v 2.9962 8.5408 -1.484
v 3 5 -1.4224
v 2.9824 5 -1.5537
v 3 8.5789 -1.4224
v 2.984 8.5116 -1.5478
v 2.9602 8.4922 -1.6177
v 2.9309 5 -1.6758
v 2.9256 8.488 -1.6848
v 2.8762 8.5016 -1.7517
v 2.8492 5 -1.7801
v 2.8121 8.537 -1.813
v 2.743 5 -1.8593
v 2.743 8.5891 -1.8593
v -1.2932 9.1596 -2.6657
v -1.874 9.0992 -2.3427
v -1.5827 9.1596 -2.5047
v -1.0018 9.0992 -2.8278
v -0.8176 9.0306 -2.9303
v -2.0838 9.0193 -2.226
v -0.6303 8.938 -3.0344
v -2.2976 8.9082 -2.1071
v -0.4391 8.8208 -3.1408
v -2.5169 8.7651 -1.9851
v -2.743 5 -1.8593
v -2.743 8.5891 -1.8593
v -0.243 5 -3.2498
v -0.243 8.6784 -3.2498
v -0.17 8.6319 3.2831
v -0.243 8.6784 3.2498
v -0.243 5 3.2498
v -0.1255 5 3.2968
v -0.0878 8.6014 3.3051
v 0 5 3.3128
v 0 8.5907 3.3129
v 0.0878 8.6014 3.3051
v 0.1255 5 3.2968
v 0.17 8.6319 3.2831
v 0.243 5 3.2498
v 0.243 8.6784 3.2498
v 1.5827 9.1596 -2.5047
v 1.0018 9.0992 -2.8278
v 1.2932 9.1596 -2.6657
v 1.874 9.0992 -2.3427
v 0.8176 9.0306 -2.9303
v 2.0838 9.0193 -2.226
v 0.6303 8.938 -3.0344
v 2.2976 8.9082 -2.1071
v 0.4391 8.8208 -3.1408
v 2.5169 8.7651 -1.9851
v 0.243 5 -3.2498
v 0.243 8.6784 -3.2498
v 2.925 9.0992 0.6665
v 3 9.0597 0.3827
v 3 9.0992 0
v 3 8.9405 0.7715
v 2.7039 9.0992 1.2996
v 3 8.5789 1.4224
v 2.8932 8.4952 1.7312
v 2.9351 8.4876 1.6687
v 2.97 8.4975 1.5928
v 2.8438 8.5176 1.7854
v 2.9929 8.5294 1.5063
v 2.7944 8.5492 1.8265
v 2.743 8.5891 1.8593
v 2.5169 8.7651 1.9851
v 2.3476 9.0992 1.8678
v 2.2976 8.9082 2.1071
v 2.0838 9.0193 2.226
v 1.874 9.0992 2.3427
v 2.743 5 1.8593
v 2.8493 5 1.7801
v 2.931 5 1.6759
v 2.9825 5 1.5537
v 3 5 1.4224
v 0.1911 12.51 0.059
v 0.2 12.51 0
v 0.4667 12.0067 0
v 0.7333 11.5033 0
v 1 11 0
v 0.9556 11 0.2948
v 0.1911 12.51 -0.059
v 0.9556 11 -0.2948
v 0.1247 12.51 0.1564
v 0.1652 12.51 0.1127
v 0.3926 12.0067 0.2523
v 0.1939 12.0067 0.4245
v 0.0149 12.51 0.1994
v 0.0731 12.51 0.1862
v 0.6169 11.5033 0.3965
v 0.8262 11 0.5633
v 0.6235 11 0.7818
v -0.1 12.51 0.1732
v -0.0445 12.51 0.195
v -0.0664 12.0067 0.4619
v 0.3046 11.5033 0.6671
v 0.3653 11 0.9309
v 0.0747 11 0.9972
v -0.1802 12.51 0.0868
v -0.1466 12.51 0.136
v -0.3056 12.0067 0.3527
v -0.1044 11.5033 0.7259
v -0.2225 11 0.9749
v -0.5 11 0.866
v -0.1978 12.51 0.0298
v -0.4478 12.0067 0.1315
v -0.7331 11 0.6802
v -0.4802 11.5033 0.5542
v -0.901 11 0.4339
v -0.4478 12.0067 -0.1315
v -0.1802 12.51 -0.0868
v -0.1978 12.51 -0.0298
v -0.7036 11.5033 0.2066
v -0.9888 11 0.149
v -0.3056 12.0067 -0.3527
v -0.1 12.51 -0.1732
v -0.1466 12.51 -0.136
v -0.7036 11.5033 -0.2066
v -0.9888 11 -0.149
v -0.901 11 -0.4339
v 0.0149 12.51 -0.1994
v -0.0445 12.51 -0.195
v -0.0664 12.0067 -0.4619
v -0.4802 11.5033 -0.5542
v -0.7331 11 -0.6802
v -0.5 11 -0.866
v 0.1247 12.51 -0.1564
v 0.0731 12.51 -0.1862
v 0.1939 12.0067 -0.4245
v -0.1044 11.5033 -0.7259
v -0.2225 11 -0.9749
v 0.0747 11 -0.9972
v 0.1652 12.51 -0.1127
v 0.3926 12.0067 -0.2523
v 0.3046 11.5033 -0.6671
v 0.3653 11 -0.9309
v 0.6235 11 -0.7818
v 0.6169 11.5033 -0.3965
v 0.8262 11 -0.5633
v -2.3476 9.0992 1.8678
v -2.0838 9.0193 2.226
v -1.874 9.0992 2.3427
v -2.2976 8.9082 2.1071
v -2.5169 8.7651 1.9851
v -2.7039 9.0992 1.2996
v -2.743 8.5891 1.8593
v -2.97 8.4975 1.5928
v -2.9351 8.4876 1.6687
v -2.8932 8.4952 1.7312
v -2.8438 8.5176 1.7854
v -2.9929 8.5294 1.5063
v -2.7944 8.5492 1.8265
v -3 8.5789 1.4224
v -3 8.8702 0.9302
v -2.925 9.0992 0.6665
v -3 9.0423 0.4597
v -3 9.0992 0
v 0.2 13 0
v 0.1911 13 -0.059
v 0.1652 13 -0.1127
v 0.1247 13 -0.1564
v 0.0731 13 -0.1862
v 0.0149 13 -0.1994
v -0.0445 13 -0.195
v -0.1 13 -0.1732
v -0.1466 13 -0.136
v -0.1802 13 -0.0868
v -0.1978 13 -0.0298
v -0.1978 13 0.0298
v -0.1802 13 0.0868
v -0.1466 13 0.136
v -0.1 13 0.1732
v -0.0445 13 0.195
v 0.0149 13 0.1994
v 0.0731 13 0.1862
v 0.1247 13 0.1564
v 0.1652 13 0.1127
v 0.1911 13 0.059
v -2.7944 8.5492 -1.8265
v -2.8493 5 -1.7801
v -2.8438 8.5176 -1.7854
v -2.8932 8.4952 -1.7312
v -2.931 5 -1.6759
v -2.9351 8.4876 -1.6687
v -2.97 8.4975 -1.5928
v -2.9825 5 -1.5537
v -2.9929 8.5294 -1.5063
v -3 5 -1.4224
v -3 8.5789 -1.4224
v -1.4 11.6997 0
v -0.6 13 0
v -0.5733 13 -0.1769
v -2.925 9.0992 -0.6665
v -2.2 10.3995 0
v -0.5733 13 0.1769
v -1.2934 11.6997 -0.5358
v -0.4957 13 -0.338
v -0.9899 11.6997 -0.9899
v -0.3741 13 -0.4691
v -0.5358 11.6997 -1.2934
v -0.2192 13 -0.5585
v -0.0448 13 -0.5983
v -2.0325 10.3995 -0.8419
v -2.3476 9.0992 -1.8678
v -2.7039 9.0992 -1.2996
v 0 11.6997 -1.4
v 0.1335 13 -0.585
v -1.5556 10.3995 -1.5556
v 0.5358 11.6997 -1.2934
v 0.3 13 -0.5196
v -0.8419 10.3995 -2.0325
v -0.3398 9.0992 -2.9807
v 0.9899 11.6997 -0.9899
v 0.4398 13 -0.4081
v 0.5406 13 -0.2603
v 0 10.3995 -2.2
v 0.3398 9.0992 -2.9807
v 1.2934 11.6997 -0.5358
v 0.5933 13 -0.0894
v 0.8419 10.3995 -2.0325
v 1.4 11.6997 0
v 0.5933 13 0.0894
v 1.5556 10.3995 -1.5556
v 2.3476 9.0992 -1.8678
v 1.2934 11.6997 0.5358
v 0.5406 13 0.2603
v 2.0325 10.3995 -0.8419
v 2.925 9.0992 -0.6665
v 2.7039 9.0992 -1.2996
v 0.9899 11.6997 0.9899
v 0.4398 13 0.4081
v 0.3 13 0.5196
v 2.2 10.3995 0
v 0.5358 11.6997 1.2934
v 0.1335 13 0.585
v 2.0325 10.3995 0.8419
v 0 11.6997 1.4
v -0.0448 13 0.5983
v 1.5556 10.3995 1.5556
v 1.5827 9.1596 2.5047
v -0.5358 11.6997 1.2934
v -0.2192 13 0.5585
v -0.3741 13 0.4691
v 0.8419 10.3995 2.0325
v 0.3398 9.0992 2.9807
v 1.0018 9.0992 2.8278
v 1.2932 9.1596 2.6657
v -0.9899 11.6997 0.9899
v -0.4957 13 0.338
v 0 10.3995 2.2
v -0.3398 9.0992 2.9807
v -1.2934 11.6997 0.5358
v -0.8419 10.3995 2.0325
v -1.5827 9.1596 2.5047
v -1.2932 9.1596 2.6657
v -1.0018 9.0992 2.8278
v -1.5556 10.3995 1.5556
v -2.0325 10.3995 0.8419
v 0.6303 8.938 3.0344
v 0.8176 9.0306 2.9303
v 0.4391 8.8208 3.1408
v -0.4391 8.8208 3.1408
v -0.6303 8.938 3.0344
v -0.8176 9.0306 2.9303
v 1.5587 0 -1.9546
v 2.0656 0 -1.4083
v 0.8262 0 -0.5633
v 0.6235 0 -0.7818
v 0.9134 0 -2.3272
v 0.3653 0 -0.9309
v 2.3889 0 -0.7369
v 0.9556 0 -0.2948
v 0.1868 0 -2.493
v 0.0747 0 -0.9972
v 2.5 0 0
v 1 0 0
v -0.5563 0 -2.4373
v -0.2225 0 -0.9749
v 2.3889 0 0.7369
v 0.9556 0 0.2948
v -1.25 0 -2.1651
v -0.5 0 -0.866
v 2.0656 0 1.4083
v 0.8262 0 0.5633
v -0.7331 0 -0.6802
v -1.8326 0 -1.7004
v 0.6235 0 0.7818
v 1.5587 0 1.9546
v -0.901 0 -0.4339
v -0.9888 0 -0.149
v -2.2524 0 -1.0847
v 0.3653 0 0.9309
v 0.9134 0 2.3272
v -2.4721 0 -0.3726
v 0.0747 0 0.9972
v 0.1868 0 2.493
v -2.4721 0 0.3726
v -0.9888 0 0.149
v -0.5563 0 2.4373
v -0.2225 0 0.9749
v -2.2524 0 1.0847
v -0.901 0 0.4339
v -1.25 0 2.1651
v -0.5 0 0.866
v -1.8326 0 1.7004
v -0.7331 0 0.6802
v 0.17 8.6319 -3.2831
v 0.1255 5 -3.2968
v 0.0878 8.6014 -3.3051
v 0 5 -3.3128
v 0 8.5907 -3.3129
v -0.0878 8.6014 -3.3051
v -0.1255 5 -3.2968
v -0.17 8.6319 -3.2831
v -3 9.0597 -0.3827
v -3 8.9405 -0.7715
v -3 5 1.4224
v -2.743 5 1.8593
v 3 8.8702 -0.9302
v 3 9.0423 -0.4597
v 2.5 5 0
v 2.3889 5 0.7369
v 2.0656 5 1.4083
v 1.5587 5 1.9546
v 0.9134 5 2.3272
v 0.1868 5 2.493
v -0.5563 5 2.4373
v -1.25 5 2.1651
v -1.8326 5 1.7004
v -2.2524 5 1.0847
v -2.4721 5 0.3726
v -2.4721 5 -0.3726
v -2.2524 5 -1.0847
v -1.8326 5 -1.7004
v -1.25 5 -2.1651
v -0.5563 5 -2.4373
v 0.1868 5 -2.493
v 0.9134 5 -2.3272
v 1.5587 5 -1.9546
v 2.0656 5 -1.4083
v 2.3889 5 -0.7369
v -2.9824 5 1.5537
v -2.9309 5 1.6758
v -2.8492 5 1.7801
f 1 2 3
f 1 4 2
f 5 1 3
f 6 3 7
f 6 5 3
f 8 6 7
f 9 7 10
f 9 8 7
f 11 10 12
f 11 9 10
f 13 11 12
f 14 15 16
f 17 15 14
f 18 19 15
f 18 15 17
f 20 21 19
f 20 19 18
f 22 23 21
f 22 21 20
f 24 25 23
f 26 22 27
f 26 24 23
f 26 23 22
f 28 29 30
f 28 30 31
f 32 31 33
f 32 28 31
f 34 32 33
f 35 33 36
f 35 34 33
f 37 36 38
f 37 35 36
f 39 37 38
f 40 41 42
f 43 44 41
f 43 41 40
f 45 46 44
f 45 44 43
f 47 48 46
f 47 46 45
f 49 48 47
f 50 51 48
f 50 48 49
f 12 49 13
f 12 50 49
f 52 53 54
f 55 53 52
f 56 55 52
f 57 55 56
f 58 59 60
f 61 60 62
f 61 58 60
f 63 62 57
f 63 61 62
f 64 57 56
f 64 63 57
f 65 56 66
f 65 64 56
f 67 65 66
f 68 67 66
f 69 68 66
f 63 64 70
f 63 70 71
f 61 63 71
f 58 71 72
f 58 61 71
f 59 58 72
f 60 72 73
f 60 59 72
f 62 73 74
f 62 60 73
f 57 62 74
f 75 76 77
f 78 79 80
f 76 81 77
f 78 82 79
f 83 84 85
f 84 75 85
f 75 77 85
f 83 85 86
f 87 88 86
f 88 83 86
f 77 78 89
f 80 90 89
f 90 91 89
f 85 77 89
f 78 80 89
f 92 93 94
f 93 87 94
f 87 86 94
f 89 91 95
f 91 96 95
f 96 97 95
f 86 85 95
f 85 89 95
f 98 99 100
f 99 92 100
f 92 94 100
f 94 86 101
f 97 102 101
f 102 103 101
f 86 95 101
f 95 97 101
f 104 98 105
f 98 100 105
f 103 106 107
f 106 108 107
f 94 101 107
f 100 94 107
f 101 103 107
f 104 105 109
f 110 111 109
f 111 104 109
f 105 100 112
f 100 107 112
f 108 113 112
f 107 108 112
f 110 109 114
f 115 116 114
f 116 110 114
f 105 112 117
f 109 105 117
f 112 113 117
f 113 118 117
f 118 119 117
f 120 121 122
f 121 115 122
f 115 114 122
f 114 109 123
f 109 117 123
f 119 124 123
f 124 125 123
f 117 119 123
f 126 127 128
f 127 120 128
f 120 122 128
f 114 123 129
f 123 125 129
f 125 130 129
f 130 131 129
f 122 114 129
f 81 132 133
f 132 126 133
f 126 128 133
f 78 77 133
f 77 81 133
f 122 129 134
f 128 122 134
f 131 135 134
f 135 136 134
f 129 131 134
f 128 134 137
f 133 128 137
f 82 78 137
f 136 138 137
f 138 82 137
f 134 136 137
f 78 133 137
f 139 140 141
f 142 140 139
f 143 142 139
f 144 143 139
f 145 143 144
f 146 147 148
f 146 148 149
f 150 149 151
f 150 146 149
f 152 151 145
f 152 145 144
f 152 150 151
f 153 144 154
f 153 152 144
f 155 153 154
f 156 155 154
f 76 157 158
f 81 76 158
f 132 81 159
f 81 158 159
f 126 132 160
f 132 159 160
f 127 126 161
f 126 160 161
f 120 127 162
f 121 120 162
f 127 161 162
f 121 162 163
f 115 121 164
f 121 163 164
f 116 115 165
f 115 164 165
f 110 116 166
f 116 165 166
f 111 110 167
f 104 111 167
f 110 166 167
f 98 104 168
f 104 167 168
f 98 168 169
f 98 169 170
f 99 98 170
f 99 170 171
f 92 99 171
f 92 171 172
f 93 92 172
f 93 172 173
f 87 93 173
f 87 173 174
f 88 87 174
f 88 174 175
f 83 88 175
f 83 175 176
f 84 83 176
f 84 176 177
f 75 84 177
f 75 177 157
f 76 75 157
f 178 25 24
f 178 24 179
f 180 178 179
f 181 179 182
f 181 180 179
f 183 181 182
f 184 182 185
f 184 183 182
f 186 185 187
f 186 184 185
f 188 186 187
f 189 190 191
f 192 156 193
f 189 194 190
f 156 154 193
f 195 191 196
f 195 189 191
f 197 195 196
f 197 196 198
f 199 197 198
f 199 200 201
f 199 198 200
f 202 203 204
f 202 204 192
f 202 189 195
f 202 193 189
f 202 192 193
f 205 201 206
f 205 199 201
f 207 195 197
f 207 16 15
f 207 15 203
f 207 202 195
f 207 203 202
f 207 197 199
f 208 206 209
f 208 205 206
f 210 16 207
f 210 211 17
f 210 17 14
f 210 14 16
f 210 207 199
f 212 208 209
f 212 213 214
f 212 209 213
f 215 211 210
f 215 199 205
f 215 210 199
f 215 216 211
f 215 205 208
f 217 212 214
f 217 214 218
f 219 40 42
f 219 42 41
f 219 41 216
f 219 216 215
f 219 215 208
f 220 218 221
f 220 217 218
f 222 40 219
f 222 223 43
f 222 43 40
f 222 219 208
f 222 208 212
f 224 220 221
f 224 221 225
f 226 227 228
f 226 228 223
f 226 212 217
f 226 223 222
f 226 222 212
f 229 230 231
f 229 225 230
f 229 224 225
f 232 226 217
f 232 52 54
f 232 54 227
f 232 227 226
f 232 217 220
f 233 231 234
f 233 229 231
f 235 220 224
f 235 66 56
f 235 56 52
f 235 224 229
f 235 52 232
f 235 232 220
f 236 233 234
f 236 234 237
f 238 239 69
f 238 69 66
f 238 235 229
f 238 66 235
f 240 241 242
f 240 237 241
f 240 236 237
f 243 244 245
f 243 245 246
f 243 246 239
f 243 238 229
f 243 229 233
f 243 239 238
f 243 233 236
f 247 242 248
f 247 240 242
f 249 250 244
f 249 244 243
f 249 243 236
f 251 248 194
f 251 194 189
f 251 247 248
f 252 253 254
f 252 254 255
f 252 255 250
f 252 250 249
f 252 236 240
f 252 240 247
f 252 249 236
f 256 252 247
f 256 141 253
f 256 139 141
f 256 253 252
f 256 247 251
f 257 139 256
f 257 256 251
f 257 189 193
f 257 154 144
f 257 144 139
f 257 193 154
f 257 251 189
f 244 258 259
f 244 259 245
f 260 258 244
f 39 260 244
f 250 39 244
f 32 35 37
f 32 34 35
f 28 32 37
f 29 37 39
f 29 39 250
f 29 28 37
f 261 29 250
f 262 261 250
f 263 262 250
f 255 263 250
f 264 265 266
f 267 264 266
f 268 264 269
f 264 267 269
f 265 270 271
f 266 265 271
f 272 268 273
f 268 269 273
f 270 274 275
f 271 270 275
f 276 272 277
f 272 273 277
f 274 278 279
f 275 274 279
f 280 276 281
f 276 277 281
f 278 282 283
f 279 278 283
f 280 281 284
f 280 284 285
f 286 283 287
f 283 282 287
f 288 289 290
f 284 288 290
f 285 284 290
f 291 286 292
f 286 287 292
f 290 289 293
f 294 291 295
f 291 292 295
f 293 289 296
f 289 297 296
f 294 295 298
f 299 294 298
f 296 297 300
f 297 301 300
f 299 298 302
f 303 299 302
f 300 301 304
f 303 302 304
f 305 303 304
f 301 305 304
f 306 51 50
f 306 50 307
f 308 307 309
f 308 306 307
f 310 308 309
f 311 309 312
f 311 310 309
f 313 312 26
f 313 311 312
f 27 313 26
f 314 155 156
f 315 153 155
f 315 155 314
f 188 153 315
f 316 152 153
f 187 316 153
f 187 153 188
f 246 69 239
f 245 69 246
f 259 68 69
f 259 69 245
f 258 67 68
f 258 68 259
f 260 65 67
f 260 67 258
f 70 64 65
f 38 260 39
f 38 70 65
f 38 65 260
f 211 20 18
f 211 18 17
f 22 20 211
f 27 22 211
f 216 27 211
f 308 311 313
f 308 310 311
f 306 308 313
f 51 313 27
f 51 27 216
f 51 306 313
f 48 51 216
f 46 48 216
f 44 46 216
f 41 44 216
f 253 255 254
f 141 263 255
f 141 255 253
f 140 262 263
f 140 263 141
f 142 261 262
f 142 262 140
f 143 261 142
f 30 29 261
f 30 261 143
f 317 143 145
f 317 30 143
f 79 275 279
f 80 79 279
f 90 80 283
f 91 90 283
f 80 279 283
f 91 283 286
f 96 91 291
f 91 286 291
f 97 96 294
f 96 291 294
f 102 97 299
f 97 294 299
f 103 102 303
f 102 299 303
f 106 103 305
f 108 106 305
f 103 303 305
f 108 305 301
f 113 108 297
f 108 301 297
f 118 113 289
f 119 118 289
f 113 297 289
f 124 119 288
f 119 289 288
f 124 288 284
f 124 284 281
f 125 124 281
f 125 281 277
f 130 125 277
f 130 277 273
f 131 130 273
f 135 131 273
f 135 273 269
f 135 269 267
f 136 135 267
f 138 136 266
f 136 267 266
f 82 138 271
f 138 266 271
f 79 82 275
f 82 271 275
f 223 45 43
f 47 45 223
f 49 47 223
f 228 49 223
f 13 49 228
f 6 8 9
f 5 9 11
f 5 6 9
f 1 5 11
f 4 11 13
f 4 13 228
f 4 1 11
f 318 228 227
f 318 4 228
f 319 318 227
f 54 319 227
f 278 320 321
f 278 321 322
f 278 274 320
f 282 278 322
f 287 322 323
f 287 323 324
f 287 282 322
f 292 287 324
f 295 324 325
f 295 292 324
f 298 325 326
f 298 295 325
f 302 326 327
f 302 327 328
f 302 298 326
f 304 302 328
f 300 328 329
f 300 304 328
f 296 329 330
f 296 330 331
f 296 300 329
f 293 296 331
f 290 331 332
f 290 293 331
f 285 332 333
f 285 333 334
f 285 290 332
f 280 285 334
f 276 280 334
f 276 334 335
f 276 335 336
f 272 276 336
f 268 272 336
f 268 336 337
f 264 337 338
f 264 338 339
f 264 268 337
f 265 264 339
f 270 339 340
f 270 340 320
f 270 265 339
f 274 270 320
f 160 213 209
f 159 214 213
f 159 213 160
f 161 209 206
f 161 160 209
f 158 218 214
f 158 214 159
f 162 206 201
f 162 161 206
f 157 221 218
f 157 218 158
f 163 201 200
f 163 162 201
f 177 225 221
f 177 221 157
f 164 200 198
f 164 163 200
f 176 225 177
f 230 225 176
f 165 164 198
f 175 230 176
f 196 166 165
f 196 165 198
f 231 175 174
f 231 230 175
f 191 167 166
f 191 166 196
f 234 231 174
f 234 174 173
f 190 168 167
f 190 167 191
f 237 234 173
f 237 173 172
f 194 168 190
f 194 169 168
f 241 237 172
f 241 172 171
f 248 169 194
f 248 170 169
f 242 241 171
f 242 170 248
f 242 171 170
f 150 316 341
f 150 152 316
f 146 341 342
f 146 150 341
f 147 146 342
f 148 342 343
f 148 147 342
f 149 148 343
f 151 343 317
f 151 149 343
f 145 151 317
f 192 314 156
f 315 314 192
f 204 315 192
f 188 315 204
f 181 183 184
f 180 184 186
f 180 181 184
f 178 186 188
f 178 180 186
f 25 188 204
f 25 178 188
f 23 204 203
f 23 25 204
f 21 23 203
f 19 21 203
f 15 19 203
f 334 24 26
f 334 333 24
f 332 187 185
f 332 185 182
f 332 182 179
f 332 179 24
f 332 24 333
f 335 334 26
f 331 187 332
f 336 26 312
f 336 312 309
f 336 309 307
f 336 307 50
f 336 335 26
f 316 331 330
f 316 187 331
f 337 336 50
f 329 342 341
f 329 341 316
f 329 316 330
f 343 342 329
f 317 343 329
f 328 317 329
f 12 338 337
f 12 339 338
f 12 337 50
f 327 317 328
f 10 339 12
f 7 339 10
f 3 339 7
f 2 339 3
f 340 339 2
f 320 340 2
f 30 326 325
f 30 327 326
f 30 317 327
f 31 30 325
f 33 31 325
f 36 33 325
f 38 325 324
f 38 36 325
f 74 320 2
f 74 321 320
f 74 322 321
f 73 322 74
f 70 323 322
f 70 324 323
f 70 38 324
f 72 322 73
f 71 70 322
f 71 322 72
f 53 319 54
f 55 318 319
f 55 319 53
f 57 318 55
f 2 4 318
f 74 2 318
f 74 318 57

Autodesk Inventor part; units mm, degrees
ref_plane "YZ Plane" through (0, 0, 0) normal (1, 0, 0) x (0, 1, 0)
ref_plane "XZ Plane" through (0, 0, 0) normal (0, 1, 0) x (-1, 0, 0)
ref_plane "XY Plane" through (0, 0, 0) normal (0, 0, 1) x (1, 0, 0)
sketch "Sketch1" plane through (0, 0, 0) normal (0, 1, 0) x (-1, 0, 0)
  line L0 (0, -4.739) -> (0, 4.739) construction
  line L1 (4.2, 0) -> (-4.2, 0) construction
  line L2 (3, 1.7164) -> (3, -1.7164)
  line L3 (3, -1.7164) -> (0, -3.385)
  line L4 (0, -3.385) -> (-3, -1.7164)
  line L5 (-3, -1.7164) -> (-3, 1.7164)
  line L6 (-3, 1.7164) -> (0, 3.385)
  line L7 (0, 3.385) -> (3, 1.7164)
  point P0 (3, 0)
  point P1 (-3, 0)
  dimension "d2" = 6.77
  dimension "d3" = 6
extrude "Extrusion1" add sketch "Sketch1" along normal blind 13
fillet "Fillet1" radius 0.5 6 edges at (0, 6.5, 3.385) (3, 6.5, 1.7164) (3, 6.5, -1.7164) (0, 6.5, -3.385) (-3, 6.5, -1.7164) (-3, 6.5, 1.7164)
sketch "Sketch2" plane through (0, 0, 0) normal (0, 0, 1) x (1, 0, 0)
  line L0 (-0.243, 13) -> (0.243, 13) projected
  line L1 (0, 13) -> (-0.1, 13)
  line L2 (-0.1, 13) -> (-0.6, 13)
  line L3 (-0.6, 13) -> (-3, 9.0992)
  line L4 (-0.243, 13) -> (-2.743, 13) projected
  line L5 (0, 13) -> (0, 13.665)
  line L6 (-0.6, 13) -> (-4.1, 13)
  line L7 (-4.1, 13) -> (-4.1, 7.3113)
  line L8 (-3, 13) -> (-3, 0) projected
  line L9 (-4.1, 7.3113) -> (-3, 9.0992)
  point P0 (0, 0)
  dimension "d7" = 0.1
  dimension "d8" = 0.5
  dimension "d9" = 4.58
  dimension "d11" = 3.5
revolve "Revolution1" cut sketch "Sketch2" angle 360 about axis through (0, 13, 0) along (0, 1, 0)
sketch "Sketch3" plane through (0, 0, 0) normal (0, -1, 0) x (1, 0, 0)
  circle A0 centre (0, 0) radius 2.5
  arc A1 (-2.743, 1.8593) -> (-3, 1.4224) centre (-2.5, 1.4224) ccw projected
  line L0 (-3, -1.4224) -> (-3, 1.4224) projected
  arc A2 (-3, -1.4224) -> (-2.743, -1.8593) centre (-2.5, -1.4224) ccw projected
  line L1 (-0.243, -3.2498) -> (-2.743, -1.8593) projected
  arc A3 (-0.243, -3.2498) -> (0.243, -3.2498) centre (0, -2.8129) ccw projected
  line L2 (2.743, -1.8593) -> (0.243, -3.2498) projected
  arc A4 (2.743, -1.8593) -> (3, -1.4224) centre (2.5, -1.4224) ccw projected
  line L3 (3, 1.4224) -> (3, -1.4224) projected
  arc A5 (3, 1.4224) -> (2.743, 1.8593) centre (2.5, 1.4224) ccw projected
  line L4 (0.243, 3.2498) -> (2.743, 1.8593) projected
  arc A6 (0.243, 3.2498) -> (-0.243, 3.2498) centre (0, 2.8129) ccw projected
  line L5 (-2.743, 1.8593) -> (-0.243, 3.2498) projected
  dimension "d12" = 5
extrude "Extrusion2" cut sketch "Sketch3" against normal blind 5
thread "Thread1" size "M6x1" class "6g" standard "ANSI Metric M Profile" length 4
sketch "Sketch4" plane through (0, 0, 0) normal (0, -1, 0) x (1, 0, 0)
  circle A0 centre (0, 0) radius 0.6 projected
  circle A1 centre (0, 0) radius 1
  point P0 (0, 0)
  dimension "d20" = 2
extrude "Extrusion3" cut sketch "Sketch4" against normal blind 11 contours A0 | A1
sketch "Sketch5" plane through (0, 0, 0) normal (0, 0, 1) x (1, 0, 0)
  line L0 (1, 11) -> (-1, 11) projected
  line L1 (-1, 11) -> (-0.2, 12.51)
  line L2 (1, 11) -> (0.2, 12.51)
  line L3 (-0.2, 12.51) -> (0.2, 12.51) construction
  line L4 (0, -2.6) -> (0, 15.6) projected
  line L5 (0.6, 13) -> (-0.6, 13) projected
  line L6 (0.2, 12.51) -> (0.2, 13.1094)
  line L7 (0.2, 13.1094) -> (-0.2, 13.1094)
  line L8 (-0.2, 13.1094) -> (-0.2, 12.51)
  point P0 (0, 0)
  point P1 (0, 12.51)
  point P2 (0, 13.1094)
  point P3 (0, 11)
  dimension "d25" = 0.4
  dimension "d26" = 1.51
revolve "Revolution2" cut sketch "Sketch5" angle 360 about axis through (0, -10, 0) along (0, 1, 0) contours L0 L4 L5 L6 L2 | L4 L7 L6 L5
properties part number "Nozzle 0.4mm" material "Brass, Soft Yellow"
